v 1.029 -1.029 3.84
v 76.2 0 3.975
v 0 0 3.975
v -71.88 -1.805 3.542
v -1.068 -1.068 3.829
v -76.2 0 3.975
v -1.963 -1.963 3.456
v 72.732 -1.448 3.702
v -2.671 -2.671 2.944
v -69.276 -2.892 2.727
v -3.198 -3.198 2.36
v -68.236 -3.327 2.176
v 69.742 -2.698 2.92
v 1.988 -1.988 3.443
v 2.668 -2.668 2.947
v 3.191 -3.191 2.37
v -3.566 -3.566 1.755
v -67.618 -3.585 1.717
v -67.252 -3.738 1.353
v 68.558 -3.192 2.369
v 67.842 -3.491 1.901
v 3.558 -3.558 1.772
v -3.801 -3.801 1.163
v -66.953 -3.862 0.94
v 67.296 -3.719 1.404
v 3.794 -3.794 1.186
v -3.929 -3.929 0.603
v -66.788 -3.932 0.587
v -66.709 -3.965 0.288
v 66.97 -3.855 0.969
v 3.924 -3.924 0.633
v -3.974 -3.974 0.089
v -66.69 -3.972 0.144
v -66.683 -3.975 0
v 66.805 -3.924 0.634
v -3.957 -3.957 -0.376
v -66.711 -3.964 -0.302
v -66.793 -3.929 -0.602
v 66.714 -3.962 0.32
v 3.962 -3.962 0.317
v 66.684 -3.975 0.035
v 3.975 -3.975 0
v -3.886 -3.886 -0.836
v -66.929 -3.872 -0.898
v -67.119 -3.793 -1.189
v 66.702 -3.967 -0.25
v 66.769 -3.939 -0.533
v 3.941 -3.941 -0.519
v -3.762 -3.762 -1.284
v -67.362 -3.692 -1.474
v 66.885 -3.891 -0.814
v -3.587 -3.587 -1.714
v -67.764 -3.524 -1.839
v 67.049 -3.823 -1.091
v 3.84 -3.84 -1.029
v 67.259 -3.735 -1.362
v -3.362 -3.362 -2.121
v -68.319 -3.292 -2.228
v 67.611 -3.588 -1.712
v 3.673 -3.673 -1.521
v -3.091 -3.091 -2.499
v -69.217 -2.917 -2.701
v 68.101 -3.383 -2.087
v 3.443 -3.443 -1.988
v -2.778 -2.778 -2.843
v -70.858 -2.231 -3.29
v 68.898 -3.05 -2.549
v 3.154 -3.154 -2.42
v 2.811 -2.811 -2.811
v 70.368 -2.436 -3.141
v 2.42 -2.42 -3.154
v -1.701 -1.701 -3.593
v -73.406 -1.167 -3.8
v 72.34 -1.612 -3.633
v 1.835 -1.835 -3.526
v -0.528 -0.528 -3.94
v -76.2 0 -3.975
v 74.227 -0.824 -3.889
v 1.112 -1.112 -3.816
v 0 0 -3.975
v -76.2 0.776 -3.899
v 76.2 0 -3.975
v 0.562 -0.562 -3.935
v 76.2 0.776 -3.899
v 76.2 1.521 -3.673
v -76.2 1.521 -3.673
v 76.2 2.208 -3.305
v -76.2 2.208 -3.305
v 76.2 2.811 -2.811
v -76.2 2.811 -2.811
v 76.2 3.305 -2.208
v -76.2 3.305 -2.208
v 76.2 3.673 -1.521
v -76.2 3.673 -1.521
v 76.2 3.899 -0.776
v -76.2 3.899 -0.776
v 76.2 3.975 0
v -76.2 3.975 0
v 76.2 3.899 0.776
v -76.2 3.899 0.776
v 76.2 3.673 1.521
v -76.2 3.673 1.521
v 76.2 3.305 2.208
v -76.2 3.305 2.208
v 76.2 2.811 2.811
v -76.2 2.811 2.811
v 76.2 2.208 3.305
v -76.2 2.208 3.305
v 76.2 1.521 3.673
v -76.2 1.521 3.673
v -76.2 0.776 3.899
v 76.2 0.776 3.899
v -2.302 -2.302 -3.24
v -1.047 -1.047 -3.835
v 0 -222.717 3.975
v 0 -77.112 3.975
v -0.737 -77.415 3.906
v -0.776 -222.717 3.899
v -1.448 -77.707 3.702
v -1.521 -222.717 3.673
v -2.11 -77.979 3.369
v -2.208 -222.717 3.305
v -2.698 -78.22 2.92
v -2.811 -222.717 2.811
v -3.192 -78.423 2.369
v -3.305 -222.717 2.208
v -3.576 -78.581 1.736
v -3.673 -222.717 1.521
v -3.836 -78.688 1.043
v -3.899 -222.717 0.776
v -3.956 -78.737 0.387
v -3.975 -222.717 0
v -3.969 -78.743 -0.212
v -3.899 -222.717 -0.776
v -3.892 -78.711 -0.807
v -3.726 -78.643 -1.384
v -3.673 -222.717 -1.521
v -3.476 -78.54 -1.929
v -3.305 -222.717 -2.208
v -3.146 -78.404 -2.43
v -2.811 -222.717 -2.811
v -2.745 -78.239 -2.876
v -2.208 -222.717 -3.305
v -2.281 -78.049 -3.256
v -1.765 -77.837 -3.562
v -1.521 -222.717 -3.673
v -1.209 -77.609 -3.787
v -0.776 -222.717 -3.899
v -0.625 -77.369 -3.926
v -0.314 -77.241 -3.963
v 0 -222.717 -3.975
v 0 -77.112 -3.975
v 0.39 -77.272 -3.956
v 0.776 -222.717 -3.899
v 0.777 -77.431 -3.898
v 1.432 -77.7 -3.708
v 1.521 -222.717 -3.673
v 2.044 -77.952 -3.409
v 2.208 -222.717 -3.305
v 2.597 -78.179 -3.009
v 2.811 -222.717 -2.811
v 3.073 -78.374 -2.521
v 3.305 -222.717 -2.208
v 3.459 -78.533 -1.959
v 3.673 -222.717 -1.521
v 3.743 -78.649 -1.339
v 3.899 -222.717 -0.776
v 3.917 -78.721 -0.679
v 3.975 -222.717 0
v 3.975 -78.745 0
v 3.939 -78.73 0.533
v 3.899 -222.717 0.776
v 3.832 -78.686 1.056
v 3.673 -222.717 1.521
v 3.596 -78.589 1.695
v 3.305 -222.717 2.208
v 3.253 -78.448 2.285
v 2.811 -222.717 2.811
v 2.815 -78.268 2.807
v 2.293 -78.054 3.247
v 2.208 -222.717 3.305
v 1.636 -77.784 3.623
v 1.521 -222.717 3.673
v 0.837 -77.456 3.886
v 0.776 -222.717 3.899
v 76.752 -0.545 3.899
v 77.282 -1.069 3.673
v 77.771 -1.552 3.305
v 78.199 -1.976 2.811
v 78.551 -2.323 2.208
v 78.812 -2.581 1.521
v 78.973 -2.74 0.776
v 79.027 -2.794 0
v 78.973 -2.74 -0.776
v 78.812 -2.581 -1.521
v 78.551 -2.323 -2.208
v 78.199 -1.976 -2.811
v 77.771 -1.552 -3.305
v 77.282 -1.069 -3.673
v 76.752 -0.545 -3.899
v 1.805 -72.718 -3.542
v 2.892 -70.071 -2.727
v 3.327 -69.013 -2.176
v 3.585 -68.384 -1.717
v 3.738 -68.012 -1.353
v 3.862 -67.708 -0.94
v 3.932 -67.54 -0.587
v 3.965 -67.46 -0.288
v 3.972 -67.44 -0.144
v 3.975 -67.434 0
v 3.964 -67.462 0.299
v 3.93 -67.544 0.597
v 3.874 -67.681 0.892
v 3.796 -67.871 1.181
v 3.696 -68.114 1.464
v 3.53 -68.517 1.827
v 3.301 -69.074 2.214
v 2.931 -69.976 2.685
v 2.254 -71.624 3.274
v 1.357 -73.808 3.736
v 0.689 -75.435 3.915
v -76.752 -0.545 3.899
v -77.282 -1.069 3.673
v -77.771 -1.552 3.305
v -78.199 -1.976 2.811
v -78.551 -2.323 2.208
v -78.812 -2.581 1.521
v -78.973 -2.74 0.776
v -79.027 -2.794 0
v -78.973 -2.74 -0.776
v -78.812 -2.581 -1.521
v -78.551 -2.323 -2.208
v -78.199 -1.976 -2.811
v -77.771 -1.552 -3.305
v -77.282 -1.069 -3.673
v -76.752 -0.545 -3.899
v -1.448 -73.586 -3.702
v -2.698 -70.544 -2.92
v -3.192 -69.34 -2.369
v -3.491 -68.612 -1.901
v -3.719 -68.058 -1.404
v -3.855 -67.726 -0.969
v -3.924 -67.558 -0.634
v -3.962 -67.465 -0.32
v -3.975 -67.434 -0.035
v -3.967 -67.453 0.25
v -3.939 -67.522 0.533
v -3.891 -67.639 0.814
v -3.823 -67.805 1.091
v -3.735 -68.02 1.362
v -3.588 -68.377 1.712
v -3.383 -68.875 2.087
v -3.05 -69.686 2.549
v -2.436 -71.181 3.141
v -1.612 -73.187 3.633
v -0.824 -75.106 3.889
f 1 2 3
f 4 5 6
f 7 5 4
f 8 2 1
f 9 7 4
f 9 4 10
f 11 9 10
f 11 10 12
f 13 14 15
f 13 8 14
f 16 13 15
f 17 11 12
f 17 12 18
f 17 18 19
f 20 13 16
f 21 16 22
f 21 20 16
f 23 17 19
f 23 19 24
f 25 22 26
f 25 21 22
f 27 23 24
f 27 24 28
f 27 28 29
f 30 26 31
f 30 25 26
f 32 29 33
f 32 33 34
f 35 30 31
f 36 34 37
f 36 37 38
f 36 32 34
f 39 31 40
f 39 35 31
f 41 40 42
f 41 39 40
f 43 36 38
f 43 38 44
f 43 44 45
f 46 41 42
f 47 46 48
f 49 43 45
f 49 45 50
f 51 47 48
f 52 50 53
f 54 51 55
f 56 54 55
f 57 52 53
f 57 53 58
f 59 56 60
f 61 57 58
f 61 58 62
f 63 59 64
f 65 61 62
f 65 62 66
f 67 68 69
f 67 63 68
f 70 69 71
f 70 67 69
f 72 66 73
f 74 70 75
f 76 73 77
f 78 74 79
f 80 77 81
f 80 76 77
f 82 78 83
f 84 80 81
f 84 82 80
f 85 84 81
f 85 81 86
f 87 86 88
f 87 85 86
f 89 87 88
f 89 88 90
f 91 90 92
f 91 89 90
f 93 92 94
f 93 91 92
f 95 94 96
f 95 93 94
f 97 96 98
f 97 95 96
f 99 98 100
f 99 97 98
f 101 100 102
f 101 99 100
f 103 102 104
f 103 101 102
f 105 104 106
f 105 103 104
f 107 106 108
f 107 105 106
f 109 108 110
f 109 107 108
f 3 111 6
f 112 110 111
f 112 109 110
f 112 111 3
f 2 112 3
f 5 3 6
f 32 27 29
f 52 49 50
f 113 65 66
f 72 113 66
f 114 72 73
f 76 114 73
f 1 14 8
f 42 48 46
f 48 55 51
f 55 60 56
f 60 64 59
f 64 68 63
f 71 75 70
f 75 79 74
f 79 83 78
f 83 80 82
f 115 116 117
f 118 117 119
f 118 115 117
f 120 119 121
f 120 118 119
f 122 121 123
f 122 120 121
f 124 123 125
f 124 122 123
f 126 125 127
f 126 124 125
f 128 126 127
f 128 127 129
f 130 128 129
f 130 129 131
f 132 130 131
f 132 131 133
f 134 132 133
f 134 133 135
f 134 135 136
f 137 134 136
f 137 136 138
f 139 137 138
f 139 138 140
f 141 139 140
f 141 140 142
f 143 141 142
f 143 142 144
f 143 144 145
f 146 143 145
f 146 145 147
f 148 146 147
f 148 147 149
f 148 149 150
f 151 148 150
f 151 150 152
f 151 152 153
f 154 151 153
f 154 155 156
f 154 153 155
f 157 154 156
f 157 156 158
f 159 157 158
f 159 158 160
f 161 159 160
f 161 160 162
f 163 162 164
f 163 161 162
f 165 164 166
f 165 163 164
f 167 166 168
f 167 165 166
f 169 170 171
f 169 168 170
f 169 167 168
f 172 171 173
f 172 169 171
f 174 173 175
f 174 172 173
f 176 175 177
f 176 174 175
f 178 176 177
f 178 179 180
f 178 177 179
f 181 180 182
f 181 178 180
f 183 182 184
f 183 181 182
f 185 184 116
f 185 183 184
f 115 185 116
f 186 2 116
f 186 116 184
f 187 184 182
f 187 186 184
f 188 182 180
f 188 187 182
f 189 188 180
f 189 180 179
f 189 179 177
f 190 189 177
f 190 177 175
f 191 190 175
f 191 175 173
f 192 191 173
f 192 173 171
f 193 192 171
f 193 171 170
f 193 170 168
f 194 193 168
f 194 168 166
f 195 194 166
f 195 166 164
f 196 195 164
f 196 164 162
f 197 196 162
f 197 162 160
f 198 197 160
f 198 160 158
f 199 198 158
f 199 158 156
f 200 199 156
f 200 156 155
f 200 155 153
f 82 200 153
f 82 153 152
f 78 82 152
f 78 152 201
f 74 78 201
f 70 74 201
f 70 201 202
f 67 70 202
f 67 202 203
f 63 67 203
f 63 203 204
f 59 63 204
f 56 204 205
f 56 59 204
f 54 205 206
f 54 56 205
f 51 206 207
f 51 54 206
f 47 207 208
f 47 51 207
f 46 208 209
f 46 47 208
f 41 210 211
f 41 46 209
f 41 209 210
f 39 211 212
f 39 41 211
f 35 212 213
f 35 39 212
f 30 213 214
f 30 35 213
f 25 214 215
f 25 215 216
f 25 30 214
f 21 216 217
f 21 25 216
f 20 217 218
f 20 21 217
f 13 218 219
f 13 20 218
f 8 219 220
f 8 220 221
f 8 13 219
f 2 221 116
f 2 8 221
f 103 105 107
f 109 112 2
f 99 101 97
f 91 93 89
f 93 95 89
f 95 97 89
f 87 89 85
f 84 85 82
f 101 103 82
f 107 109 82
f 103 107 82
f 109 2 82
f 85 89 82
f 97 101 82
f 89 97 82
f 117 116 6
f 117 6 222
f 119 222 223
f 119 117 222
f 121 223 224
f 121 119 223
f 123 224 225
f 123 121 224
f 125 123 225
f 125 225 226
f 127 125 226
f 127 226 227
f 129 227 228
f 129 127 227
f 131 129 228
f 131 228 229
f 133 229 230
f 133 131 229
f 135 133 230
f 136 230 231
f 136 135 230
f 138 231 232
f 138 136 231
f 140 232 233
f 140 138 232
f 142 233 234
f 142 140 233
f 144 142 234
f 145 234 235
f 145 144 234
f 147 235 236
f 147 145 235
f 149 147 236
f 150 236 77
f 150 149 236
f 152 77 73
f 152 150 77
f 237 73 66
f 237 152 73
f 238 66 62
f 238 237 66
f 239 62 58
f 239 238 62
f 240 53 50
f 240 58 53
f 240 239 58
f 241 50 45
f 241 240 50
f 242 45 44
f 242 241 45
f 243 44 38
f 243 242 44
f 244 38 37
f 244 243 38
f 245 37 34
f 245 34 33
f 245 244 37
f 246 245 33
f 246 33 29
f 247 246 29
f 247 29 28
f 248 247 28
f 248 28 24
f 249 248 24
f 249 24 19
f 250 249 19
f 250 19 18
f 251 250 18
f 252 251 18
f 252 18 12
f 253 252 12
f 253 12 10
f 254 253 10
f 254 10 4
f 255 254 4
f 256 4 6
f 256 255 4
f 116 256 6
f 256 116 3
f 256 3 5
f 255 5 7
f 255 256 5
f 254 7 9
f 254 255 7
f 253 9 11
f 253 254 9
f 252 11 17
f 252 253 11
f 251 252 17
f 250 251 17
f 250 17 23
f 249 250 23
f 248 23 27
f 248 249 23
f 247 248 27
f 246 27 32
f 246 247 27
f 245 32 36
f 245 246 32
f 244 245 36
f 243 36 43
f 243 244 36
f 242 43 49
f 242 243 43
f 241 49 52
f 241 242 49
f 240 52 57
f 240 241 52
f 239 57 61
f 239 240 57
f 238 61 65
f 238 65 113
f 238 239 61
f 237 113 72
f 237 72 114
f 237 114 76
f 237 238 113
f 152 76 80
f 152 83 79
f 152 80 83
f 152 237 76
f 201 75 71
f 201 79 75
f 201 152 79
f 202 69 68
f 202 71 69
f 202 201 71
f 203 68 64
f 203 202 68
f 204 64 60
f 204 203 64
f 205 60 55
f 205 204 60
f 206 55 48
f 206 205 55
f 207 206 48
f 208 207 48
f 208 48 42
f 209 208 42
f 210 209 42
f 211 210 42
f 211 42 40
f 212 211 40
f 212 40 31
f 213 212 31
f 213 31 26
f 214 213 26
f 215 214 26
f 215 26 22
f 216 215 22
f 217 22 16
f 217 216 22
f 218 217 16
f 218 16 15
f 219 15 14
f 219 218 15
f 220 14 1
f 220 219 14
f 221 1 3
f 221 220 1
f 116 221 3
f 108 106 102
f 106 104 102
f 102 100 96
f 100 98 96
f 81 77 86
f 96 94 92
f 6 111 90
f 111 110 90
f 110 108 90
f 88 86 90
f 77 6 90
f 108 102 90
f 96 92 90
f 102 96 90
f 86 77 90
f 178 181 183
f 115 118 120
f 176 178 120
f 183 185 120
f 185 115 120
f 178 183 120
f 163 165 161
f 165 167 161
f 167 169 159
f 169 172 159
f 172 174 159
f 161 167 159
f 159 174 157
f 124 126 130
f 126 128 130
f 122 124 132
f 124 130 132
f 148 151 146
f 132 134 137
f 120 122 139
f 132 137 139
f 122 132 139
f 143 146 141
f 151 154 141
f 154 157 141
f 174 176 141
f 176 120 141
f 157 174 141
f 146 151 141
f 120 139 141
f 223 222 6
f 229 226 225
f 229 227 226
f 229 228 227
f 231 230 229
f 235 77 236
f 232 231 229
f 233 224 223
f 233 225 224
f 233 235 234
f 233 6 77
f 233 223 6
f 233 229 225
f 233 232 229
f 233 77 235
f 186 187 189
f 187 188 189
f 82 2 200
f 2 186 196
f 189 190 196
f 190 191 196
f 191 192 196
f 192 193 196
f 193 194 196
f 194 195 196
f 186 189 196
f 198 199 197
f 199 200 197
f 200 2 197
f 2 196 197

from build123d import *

# Parameters (mm, degrees)
F1_E1_W  = 76.2
F1_E1_H  = 3.9751
F3_E0_W  = 76.2
F3_E0_H  = 3.9751
F5_E3_W  = 108.4099765605
F5_E3_H  = 3.9751
F7_E2_W  = 108.4099765605
F7_E2_H  = 3.9751
F9_E4_W  = 77.1121457219
F9_E4_H  = 3.9751
F11_E5_W = 145.6045582891
F11_E5_H = 3.9751


with BuildPart() as f2:
    # F1_E1 (on explicit) → F2 (revolve)
    with BuildSketch(Plane(origin=(0, 0, 0), x_dir=(-1, 0, 0), z_dir=(0, 1, 0))):
        with Locations((38.1, 1.98755)):
            Rectangle(F1_E1_W, F1_E1_H)
    revolve(axis=Axis((-38.1, 0, 0), (-1, 0, 0)))

    # F3_E0 (on explicit) → F4 (revolve)
    with BuildSketch(Plane.XZ):
        with Locations((38.1, 1.98755)):
            Rectangle(F3_E0_W, F3_E0_H)
    revolve(axis=Axis((38.1, 0, 0), (1, 0, 0)))

    # F5_E3 (on explicit) → F6 (revolve)
    with BuildSketch(Plane(origin=(0, -77.1121457219, 0), x_dir=(0.7028873395, 0.7113011936, 0), z_dir=(0.7113011936, -0.7028873395, 0))):
        with Locations((54.2049882802, 1.98755)):
            Rectangle(F5_E3_W, F5_E3_H)
    revolve(axis=Axis((38.1, -38.556072861, 0), (0.7028873395, 0.7113011936, 0)))

    # F7_E2 (on explicit) → F8 (revolve)
    with BuildSketch(Plane(origin=(-76.2, 0, 0), x_dir=(0.7028873395, -0.7113011936, 0), z_dir=(-0.7113011936, -0.7028873395, 0))):
        with Locations((54.2049882802, 1.98755)):
            Rectangle(F7_E2_W, F7_E2_H)
    revolve(axis=Axis((-38.1, -38.556072861, 0), (0.7028873395, -0.7113011936, 0)))

    # F9_E4 (on explicit) → F10 (revolve)
    with BuildSketch(Plane(origin=(0, 0, 0), x_dir=(0, -1, 0), z_dir=(-1, 0, 0))):
        with Locations((38.556072861, 1.98755)):
            Rectangle(F9_E4_W, F9_E4_H)
    revolve(axis=Axis((0, -38.556072861, 0), (0, -1, 0)))

    # F11_E5 (on explicit) → F12 (revolve)
    with BuildSketch(Plane(origin=(0, -77.1121457219, 0), x_dir=(0, -1, 0), z_dir=(-1, 0, 0))):
        with Locations((72.8022791445, 1.98755)):
            Rectangle(F11_E5_W, F11_E5_H)
    revolve(axis=Axis((0, -149.9144248664, 0), (0, -1, 0)))


solid = f2.part
